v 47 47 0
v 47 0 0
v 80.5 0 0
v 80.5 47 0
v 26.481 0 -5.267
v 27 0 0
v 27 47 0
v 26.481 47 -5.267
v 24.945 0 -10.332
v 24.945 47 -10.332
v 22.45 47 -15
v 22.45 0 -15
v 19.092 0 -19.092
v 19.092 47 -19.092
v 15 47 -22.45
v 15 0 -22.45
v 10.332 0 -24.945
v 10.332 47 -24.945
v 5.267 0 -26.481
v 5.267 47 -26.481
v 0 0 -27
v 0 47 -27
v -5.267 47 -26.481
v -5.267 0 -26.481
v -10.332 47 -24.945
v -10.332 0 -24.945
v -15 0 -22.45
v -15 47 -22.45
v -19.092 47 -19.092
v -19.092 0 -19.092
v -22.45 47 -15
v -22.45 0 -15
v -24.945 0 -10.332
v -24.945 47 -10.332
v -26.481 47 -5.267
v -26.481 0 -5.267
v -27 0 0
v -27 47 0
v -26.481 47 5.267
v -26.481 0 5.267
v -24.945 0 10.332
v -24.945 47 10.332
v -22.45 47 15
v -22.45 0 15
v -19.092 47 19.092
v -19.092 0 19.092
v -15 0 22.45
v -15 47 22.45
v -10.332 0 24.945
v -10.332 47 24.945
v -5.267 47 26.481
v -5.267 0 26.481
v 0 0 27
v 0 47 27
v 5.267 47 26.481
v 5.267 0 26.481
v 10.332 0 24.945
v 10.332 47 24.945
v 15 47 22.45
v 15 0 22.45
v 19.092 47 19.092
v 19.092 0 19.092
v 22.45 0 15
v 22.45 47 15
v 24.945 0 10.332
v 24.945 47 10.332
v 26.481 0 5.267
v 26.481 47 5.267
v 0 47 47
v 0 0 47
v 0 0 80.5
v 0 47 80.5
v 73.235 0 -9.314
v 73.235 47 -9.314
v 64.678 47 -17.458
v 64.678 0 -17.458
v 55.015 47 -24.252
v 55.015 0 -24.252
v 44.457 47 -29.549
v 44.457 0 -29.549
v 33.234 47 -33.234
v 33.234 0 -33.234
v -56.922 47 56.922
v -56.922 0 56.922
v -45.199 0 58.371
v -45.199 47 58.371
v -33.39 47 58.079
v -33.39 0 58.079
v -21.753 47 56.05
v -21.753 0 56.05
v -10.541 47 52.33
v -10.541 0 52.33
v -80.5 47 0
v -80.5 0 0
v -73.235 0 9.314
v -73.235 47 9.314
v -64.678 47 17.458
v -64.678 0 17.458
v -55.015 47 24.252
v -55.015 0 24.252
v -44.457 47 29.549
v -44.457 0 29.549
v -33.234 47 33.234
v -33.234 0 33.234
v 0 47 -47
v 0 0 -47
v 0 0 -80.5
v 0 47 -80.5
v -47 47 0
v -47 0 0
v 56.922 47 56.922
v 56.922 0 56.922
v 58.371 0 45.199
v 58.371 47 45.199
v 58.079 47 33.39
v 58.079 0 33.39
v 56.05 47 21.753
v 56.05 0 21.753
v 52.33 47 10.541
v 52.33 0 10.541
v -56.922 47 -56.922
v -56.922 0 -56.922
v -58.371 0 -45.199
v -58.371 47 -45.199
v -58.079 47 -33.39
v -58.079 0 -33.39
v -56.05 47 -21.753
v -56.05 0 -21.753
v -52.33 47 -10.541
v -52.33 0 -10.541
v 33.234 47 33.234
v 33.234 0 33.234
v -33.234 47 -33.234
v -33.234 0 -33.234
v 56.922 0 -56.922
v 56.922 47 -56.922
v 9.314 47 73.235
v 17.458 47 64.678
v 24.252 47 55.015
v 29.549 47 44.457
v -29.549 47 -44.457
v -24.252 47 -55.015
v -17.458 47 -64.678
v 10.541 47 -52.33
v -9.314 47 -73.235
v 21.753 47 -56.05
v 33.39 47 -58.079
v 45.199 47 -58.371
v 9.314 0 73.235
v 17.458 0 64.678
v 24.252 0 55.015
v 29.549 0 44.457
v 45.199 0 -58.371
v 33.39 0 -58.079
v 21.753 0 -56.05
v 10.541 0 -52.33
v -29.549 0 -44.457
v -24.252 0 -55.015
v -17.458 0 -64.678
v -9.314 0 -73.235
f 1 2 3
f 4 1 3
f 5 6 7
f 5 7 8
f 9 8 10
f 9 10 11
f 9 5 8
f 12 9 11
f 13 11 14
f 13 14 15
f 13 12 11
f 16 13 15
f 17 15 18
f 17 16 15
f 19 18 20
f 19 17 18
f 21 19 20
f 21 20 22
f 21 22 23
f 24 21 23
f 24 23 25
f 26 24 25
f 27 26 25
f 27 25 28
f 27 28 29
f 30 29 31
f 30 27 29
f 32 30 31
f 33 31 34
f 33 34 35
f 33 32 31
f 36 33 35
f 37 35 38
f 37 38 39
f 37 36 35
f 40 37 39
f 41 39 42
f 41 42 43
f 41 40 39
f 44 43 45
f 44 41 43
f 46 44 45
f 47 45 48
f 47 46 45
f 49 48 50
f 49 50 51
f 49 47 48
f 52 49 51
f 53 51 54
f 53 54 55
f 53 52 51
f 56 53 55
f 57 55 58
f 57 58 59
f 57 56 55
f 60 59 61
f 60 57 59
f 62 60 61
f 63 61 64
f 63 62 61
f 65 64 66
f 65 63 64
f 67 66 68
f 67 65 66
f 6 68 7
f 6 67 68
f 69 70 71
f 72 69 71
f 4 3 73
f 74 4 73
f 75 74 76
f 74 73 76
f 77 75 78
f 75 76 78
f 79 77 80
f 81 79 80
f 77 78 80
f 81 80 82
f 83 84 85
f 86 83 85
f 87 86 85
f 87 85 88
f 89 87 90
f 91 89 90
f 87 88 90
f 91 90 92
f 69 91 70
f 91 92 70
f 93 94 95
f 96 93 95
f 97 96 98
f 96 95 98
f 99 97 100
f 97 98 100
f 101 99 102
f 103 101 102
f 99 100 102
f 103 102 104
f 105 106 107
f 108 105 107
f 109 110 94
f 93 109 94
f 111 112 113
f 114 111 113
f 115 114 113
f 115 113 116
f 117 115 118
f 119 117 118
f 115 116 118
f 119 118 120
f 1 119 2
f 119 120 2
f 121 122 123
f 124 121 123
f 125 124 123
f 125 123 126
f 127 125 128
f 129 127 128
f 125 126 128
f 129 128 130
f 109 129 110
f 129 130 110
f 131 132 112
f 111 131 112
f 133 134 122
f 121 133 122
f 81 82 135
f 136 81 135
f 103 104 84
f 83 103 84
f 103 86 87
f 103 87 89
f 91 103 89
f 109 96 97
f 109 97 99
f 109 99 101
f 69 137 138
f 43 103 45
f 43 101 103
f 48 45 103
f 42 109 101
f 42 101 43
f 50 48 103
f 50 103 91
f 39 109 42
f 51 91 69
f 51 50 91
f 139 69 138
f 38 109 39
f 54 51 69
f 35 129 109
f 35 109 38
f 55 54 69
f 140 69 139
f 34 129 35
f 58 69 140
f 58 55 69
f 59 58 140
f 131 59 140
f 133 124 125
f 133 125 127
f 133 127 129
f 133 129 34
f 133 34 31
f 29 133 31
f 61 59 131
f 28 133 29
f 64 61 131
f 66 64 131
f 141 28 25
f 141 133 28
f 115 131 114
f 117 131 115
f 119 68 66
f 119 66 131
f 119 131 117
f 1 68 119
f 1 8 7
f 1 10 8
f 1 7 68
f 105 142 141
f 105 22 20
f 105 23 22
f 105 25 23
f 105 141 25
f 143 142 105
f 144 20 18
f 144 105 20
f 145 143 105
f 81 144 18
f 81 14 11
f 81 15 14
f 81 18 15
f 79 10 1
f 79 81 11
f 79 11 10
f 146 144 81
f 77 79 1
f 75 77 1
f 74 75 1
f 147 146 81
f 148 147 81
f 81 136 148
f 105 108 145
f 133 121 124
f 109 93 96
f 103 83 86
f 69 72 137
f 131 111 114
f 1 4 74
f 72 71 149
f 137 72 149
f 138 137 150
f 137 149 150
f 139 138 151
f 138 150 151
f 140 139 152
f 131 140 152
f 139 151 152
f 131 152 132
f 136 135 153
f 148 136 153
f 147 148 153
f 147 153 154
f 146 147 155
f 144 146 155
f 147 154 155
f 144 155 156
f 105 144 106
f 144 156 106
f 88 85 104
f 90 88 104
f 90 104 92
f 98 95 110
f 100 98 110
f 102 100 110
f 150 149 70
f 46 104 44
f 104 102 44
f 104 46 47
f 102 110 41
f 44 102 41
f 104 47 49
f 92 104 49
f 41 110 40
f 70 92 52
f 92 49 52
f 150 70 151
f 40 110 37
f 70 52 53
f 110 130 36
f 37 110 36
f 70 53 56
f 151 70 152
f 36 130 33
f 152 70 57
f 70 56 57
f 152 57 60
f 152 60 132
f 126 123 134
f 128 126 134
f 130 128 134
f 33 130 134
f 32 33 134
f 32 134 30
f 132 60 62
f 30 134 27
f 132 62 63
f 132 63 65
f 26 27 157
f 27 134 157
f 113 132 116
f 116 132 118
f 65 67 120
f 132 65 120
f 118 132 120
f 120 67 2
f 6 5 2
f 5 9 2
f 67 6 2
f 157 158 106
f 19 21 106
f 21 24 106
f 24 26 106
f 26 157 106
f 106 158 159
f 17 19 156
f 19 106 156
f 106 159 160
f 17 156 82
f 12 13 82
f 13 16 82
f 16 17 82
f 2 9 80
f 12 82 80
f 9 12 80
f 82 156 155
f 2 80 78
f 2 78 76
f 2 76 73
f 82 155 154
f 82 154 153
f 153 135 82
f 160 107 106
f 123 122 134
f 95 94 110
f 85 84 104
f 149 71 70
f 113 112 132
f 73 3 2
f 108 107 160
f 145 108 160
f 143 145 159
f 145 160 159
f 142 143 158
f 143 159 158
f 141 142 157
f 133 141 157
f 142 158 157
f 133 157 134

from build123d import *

# Parameters (mm, degrees)
SKETCH_1_R      = 27
EXTRUDE_1_DEPTH = 47


with BuildPart() as part:
    # Эскиз1 → Бобышка-Вытянуть1 (new body)
    with BuildSketch(Plane(origin=(0, 0, 0), x_dir=(1, 0, 0), z_dir=(0, 1, 0))):
        with BuildLine():
            ThreePointArc((47, 0), (33.234018716, 33.234018716), (0, 47))
            ThreePointArc((0, 47), (-33.234018716, 33.234018716), (-47, 0))
            ThreePointArc((-47, 0), (-33.234018716, -33.234018716), (0, -47))
            ThreePointArc((0, -47), (33.234018716, -33.234018716), (47, 0))
        make_face()
        Circle(SKETCH_1_R, mode=Mode.SUBTRACT)
        with BuildLine():
            ThreePointArc((-47, 0), (-43.422338028, 17.986121321), (-33.234018716, 33.234018716))
            Line((-33.234018716, 33.234018716), (-56.922095886, 56.922095886))
            ThreePointArc((-56.922095886, 56.922095886), (-57.279535343, 27.533981904), (-47, 0))
        make_face()
        with BuildLine():
            ThreePointArc((-33.234018716, 33.234018716), (-17.986121321, 43.422338028), (0, 47))
            Line((0, 47), (0, 80.5))
            ThreePointArc((0, 80.5), (-21.033282547, 59.972213182), (-33.234018716, 33.234018716))
        make_face()
        with BuildLine():
            Line((33.234018716, 33.234018716), (56.922095886, 56.922095886))
            ThreePointArc((56.922095886, 56.922095886), (27.533981904, 57.279535343), (0, 47))
            ThreePointArc((0, 47), (17.986121321, 43.422338028), (33.234018716, 33.234018716))
        make_face()
        with BuildLine():
            ThreePointArc((80.5, 0), (59.972213182, 21.033282547), (33.234018716, 33.234018716))
            ThreePointArc((33.234018716, 33.234018716), (43.422338028, 17.986121321), (47, 0))
            Line((47, 0), (80.5, 0))
        make_face()
        with BuildLine():
            ThreePointArc((56.922095886, -56.922095886), (57.279535343, -27.533981904), (47, 0))
            ThreePointArc((47, 0), (43.422338028, -17.986121321), (33.234018716, -33.234018716))
            Line((33.234018716, -33.234018716), (56.922095886, -56.922095886))
        make_face()
        with BuildLine():
            ThreePointArc((0, -80.5), (21.033282547, -59.972213182), (33.234018716, -33.234018716))
            ThreePointArc((33.234018716, -33.234018716), (17.986121321, -43.422338028), (0, -47))
            Line((0, -47), (0, -80.5))
        make_face()
        with BuildLine():
            ThreePointArc((-56.922095886, -56.922095886), (-27.533981904, -57.279535343), (0, -47))
            ThreePointArc((0, -47), (-17.986121321, -43.422338028), (-33.234018716, -33.234018716))
            Line((-33.234018716, -33.234018716), (-56.922095886, -56.922095886))
        make_face()
        with BuildLine():
            ThreePointArc((-33.234018716, -33.234018716), (-43.422338028, -17.986121321), (-47, 0))
            Line((-47, 0), (-80.5, 0))
            ThreePointArc((-80.5, 0), (-59.972213182, -21.033282547), (-33.234018716, -33.234018716))
        make_face()
    extrude(amount=EXTRUDE_1_DEPTH)


solid = part.part
